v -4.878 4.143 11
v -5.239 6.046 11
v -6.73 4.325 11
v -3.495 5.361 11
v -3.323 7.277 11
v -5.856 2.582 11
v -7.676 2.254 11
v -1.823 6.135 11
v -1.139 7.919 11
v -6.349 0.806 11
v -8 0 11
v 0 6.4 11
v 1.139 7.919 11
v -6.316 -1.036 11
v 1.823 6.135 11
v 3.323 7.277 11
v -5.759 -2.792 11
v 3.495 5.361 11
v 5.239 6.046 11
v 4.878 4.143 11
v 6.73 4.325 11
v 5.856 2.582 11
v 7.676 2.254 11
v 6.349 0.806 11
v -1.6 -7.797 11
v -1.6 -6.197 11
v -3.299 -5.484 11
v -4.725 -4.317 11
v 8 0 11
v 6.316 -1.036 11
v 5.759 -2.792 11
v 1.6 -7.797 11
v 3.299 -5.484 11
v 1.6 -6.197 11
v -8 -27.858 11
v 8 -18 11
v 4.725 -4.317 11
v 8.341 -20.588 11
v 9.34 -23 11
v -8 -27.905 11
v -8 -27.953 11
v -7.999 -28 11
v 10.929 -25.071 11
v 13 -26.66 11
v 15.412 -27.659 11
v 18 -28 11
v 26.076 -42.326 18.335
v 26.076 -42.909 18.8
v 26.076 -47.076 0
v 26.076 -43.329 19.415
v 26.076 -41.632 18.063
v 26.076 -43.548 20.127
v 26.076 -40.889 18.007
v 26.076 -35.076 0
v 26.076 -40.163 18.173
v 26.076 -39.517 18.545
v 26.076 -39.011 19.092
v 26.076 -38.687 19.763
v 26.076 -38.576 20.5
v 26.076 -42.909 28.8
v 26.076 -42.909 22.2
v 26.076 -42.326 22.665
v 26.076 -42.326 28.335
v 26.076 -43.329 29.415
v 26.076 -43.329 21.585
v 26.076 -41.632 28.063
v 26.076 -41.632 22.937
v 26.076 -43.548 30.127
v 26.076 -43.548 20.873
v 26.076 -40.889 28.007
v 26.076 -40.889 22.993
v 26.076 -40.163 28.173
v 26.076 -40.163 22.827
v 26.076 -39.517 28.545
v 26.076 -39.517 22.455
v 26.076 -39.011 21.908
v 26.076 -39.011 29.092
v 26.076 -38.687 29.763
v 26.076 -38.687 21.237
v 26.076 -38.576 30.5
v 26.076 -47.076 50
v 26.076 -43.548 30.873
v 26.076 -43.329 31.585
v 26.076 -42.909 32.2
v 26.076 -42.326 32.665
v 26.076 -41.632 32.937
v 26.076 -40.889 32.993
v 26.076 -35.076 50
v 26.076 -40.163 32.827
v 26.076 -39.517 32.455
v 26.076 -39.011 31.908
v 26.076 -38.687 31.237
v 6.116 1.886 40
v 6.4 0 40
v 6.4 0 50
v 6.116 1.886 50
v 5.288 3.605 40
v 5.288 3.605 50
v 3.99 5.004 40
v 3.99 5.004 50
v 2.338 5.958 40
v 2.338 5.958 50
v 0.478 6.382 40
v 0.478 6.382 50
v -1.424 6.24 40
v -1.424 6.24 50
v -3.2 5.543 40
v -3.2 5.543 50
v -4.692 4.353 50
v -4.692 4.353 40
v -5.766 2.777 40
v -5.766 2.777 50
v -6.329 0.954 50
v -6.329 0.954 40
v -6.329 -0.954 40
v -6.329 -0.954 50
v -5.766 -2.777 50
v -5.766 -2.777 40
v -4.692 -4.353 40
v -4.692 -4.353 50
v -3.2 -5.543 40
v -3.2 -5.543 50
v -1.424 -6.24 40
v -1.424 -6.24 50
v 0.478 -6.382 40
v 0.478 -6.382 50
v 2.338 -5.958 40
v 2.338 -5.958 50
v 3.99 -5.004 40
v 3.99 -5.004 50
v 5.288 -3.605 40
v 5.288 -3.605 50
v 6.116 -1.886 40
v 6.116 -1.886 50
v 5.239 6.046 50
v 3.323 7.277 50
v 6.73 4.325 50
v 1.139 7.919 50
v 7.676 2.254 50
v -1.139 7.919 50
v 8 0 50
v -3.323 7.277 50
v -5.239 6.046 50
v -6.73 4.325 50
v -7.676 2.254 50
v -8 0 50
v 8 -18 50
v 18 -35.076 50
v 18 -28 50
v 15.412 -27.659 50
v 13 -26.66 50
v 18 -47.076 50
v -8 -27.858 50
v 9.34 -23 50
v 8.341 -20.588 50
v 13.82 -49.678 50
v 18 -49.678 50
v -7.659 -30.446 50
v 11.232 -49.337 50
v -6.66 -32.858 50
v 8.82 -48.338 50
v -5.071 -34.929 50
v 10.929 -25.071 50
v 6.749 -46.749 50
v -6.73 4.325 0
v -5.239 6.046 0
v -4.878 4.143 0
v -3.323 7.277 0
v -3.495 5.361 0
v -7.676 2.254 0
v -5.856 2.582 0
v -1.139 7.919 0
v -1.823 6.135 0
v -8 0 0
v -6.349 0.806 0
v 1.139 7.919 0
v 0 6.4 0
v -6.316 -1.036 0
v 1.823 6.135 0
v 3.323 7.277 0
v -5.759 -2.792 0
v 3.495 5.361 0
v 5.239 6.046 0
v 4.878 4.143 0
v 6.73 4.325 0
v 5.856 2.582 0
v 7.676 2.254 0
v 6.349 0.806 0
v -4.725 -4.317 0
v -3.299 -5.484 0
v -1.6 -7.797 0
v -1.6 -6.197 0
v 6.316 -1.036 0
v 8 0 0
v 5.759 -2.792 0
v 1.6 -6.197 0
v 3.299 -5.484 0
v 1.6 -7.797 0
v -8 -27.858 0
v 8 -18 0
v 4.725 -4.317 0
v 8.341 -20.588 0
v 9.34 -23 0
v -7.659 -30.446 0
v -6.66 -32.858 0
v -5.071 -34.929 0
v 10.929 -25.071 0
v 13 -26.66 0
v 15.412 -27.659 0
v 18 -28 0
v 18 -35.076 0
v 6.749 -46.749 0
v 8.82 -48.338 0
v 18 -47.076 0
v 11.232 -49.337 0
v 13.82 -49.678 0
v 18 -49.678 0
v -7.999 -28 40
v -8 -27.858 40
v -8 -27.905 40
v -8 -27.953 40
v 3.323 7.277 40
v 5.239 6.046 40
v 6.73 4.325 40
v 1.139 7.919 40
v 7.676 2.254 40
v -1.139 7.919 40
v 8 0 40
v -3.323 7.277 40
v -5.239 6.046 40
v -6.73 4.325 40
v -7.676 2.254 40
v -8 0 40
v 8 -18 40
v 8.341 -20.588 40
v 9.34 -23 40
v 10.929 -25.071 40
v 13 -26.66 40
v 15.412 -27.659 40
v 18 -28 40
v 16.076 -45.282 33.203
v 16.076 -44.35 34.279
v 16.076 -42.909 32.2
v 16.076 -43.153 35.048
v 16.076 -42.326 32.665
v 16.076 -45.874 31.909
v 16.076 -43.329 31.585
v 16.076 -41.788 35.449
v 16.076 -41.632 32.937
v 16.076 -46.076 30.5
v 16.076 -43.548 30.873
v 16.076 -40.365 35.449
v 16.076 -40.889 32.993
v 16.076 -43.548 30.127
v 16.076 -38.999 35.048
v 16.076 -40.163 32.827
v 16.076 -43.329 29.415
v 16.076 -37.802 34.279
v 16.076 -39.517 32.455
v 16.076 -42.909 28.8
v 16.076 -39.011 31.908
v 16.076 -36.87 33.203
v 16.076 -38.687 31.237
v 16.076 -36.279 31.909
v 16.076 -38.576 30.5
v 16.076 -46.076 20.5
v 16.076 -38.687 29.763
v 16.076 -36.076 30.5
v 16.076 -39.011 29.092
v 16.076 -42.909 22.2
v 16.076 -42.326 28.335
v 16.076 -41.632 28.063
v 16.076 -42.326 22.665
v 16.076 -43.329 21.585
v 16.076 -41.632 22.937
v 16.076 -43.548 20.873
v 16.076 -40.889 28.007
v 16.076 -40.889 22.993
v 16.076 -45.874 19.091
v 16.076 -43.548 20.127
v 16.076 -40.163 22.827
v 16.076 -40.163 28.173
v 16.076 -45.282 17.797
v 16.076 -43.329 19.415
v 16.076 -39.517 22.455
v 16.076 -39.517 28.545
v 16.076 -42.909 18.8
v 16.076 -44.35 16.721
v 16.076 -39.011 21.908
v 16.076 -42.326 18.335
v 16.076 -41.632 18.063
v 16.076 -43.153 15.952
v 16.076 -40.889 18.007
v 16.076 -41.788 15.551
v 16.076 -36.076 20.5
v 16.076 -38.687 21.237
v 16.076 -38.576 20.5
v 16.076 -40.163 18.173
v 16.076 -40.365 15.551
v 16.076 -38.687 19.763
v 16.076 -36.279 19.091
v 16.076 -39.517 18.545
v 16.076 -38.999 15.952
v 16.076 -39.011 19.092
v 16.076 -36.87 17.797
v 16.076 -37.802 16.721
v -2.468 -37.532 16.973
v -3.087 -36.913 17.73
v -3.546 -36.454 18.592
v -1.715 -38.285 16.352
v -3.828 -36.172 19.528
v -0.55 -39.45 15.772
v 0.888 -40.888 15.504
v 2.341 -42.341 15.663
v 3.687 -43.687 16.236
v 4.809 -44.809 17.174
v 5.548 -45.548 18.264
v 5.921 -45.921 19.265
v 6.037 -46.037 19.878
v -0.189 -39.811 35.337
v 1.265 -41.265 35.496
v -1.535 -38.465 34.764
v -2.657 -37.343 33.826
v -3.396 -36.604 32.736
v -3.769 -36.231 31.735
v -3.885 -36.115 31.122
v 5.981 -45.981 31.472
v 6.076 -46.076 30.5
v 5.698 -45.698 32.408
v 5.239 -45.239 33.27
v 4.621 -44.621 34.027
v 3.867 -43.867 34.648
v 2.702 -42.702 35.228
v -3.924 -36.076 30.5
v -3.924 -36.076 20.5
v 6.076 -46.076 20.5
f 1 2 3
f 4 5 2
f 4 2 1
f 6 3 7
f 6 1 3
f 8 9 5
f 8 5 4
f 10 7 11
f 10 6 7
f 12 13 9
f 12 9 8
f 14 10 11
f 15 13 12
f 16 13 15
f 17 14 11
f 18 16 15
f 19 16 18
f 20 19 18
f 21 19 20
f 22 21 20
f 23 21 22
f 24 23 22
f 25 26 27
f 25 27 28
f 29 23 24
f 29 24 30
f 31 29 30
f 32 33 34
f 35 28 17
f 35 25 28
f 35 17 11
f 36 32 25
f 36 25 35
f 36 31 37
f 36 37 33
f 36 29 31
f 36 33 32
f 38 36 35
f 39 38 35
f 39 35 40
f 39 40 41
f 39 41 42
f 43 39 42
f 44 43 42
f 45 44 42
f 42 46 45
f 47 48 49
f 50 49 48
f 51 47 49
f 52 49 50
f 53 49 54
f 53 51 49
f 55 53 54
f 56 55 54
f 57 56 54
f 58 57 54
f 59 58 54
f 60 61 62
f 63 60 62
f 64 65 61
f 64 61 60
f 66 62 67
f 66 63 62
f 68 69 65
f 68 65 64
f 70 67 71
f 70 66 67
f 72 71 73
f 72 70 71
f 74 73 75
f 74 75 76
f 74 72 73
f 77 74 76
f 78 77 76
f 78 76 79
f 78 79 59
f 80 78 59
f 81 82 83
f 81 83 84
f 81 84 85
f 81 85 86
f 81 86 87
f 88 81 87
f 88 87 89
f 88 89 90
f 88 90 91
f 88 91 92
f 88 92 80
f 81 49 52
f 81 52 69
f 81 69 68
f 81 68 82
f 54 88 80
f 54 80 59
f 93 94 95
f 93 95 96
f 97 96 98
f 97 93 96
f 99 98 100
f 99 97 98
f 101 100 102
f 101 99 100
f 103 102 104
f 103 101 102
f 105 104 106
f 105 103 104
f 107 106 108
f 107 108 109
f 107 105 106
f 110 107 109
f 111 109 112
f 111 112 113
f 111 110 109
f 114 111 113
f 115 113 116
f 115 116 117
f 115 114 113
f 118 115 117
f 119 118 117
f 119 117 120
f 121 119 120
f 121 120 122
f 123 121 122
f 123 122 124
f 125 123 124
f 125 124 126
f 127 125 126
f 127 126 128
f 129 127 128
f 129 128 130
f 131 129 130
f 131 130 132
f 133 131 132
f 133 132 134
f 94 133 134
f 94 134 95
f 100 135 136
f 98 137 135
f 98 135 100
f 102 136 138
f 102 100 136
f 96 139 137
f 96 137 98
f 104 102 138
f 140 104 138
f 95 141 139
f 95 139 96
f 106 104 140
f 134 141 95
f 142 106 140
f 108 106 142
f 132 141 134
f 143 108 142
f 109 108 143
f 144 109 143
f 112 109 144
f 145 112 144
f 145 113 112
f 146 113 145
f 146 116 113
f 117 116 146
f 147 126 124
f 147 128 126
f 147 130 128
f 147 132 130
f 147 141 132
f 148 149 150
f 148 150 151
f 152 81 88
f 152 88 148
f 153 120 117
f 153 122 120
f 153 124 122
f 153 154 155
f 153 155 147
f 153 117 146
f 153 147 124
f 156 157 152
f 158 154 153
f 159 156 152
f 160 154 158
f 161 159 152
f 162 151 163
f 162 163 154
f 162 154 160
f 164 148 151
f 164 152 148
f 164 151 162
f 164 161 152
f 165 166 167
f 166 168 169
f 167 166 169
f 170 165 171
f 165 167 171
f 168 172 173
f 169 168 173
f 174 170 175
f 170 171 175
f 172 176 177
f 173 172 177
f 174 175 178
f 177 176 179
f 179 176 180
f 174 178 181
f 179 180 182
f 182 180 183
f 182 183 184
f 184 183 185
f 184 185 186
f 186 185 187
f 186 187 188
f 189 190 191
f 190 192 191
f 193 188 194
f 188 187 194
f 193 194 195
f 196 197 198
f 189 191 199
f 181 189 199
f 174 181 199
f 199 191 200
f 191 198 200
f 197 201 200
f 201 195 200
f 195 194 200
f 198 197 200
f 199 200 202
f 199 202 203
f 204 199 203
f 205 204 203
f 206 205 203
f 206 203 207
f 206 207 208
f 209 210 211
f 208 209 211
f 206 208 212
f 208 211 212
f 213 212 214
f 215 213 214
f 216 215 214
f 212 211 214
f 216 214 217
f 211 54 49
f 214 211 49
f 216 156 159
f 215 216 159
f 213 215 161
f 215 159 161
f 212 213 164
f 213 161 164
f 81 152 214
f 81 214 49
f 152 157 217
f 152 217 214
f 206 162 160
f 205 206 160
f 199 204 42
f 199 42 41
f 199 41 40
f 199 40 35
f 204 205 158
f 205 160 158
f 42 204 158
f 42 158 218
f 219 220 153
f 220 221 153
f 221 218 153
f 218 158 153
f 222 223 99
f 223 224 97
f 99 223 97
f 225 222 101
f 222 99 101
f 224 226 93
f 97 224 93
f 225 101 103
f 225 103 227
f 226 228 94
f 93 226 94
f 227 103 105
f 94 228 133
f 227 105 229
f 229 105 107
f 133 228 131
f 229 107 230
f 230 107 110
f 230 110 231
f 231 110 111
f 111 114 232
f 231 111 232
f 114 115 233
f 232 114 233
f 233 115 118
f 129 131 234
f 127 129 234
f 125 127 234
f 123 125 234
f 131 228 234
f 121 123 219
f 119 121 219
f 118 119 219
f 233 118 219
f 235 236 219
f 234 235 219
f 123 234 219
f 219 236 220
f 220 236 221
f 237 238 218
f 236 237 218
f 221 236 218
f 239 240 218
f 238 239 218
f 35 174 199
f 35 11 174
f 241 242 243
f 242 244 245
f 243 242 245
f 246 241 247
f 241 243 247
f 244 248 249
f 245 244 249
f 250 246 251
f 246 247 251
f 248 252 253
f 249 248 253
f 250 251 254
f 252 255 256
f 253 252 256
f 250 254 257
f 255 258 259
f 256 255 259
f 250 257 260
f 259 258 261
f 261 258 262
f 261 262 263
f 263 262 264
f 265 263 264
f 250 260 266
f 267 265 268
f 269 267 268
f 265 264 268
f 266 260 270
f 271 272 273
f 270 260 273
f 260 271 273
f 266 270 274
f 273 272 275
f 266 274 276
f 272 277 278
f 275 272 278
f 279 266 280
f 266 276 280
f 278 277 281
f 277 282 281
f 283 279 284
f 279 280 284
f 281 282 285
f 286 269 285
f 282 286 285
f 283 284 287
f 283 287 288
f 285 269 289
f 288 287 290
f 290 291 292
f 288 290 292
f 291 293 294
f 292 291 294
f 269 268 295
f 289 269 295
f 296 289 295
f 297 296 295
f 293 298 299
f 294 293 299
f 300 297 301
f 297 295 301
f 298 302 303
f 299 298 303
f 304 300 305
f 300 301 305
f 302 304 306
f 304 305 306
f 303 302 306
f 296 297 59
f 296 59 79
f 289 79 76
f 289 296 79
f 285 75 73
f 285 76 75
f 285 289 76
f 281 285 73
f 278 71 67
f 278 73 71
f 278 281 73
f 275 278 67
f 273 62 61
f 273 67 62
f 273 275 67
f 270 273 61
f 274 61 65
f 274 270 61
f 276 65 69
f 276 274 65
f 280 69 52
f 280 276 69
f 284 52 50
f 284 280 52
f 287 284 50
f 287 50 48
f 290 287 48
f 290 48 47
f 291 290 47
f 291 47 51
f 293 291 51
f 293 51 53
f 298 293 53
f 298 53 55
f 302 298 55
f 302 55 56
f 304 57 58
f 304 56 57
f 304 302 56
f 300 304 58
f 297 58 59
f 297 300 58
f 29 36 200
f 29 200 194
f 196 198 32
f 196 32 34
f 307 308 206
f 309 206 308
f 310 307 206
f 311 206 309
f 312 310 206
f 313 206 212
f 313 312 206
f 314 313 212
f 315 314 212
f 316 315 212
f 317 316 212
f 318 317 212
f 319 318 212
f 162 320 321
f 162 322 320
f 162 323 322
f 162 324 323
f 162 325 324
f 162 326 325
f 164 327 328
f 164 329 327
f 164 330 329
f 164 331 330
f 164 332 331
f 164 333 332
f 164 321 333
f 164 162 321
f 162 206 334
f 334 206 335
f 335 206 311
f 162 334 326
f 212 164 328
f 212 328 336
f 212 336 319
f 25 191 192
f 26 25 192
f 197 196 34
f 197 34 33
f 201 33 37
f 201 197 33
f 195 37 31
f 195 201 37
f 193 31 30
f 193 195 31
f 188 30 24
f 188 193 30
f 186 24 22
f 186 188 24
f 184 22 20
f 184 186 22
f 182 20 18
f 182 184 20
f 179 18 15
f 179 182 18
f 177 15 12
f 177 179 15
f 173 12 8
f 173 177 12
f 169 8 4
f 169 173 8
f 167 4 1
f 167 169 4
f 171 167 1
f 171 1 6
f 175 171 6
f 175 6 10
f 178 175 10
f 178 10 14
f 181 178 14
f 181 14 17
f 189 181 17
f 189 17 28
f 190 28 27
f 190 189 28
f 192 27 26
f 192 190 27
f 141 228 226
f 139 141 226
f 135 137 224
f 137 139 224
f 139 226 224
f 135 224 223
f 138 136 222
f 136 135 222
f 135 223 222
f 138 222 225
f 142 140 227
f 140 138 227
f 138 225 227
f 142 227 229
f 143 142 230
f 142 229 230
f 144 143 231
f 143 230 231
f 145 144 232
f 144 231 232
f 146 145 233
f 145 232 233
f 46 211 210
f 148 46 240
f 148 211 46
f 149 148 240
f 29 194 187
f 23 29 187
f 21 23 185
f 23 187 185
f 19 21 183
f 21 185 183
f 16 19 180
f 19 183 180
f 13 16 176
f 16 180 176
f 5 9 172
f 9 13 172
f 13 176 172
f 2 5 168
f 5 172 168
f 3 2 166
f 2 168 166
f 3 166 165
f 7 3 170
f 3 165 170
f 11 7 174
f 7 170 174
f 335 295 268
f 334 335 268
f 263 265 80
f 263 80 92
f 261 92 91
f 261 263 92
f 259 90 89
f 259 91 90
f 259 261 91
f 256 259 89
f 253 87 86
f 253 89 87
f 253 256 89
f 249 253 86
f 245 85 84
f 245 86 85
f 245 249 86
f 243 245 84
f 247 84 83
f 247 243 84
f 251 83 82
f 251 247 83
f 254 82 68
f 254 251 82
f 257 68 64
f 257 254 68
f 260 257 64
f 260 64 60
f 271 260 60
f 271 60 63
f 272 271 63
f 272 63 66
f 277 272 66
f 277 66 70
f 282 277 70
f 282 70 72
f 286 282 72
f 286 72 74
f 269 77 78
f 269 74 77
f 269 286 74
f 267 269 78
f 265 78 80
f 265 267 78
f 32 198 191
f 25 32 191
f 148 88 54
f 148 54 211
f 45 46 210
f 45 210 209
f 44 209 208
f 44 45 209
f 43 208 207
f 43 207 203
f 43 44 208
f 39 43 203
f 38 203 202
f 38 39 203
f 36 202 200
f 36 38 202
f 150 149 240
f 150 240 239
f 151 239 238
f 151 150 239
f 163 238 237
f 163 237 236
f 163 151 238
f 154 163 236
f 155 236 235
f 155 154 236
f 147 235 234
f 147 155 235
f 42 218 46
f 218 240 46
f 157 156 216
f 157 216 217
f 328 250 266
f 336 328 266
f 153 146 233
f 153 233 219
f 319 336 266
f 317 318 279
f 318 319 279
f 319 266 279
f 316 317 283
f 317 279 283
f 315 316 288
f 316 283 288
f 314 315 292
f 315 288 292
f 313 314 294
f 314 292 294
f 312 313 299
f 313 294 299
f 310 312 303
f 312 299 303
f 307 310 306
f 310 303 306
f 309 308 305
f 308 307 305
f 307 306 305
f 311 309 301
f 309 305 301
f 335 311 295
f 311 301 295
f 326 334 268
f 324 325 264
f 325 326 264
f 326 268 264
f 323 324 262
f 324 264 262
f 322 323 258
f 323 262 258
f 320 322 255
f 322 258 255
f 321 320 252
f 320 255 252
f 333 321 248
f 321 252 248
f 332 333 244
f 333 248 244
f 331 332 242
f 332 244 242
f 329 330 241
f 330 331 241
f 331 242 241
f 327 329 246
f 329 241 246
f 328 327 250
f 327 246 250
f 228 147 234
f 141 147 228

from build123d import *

# Parameters (mm, degrees)
SKETCH1_R               = 12
SKETCH1_R_2             = 6.4
BOSS_EXTRUDE1_DEPTH     = 50
CUT_EXTRUDE1_DEPTH      = 53.80151513
CUT_EXTRUDE1_DEPTH_BACK = 53.80151513
SKETCH2_R               = 12
SKETCH2_R_2             = 8
BOSS_EXTRUDE2_DEPTH     = 50
SKETCH4_W               = 29
SKETCH4_H               = 42.03410999
CUT_EXTRUDE2_DEPTH      = 79.288280436
CUT_EXTRUDE6_DEPTH      = 79.288280436
CUT_EXTRUDE6_DEPTH_BACK = 79.288280436
SKETCH8_R               = 2.5
CUT_EXTRUDE9_START      = -10
CUT_EXTRUDE9_DEPTH      = 20
SKETCH10_W              = 3.2
SKETCH10_H              = 1.6
CUT_EXTRUDE10_DEPTH     = 20
FILLET1_R               = 10


with BuildPart() as part:
    # Sketch1 → Boss-Extrude1 (new body)
    with BuildSketch(Plane.XY):
        Circle(SKETCH1_R)
        Circle(SKETCH1_R_2, mode=Mode.SUBTRACT)
    extrude(amount=BOSS_EXTRUDE1_DEPTH)

    # Sketch2 → Cut-Extrude1 (cut, two sides: drawn at the far end of the back side and taken through both)
    with BuildSketch(Plane.XY.offset(50).offset(-CUT_EXTRUDE1_DEPTH_BACK)):
        Circle(SKETCH2_R)
        Circle(SKETCH2_R_2, mode=Mode.SUBTRACT)
    extrude(amount=CUT_EXTRUDE1_DEPTH + CUT_EXTRUDE1_DEPTH_BACK, mode=Mode.SUBTRACT)

    # Sketch3 → Boss-Extrude2 (add, through all)
    with BuildSketch(Plane.XY.offset(50)):
        with BuildLine():
            Line((-8, 0), (-8, -32))
            Line((-8, -32), (9.67766953, -49.67766953))
            Line((9.67766953, -49.67766953), (18, -49.67766953))
            Line((18, -49.67766953), (18, -47.076150072))
            Line((18, -47.076150072), (26.076150072, -47.076150072))
            Line((26.076150072, -47.076150072), (26.076150072, -35.076150072))
            Line((26.076150072, -35.076150072), (18, -35.076150072))
            Line((18, -35.076150072), (18, -28))
            Line((18, -28), (8, -28))
            Line((8, -28), (8, 0))
            ThreePointArc((8, 0), (0, -8), (-8, 0))
        make_face()
    extrude(amount=-BOSS_EXTRUDE2_DEPTH)

    # Sketch4 → Cut-Extrude2 (cut, through all)
    with BuildSketch(Plane(origin=(26.076150072, 0, 0), x_dir=(0, 0, -1), z_dir=(1, 0, 0))):
        with Locations((-25.5, -6.982945005)):
            Rectangle(SKETCH4_W, SKETCH4_H)
    extrude(amount=-CUT_EXTRUDE2_DEPTH, mode=Mode.SUBTRACT)

    # Sketch8 → Cut-Extrude6 (cut, two sides: drawn at the far end of the back side and taken through both)
    with BuildSketch(Plane(origin=(26.076150072, 0, 0), x_dir=(0, 0, -1), z_dir=(1, 0, 0)).offset(-CUT_EXTRUDE6_DEPTH_BACK)):
        with Locations(Location((-30.5, -41.076150072, 0), (0, 0, 90))):
            Circle(SKETCH8_R)
        with Locations(Location((-20.5, -41.076150072, 0), (0, 0, 90))):
            Circle(SKETCH8_R)
    extrude(amount=CUT_EXTRUDE6_DEPTH + CUT_EXTRUDE6_DEPTH_BACK, mode=Mode.SUBTRACT)

    # Sketch9 → Cut-Extrude9 (cut)
    with BuildSketch(Plane(origin=(26.076150072, 0, 0), x_dir=(0, 0, -1), z_dir=(1, 0, 0)).offset(CUT_EXTRUDE9_START)):
        with BuildLine():
            Line((-20.5, -36.076150072), (-30.5, -36.076150072))
            ThreePointArc((-30.5, -36.076150072), (-35.5, -41.076150072), (-30.5, -46.076150072))
            Line((-30.5, -46.076150072), (-20.5, -46.076150072))
            ThreePointArc((-20.5, -46.076150072), (-15.5, -41.076150072), (-20.5, -36.076150072))
        make_face()
    extrude(amount=-CUT_EXTRUDE9_DEPTH, mode=Mode.SUBTRACT)

    # Sketch10 → Cut-Extrude10 (cut)
    with BuildSketch(Plane(origin=(0, 0, 0), x_dir=(-1, 0, 0), z_dir=(0, 0, -1))):
        with Locations((0, -6.996773354)):
            Rectangle(SKETCH10_W, SKETCH10_H)
    extrude(amount=-CUT_EXTRUDE10_DEPTH, mode=Mode.SUBTRACT)

    # Fillet1
    # the kernel refuses this fillet: 10 mm, written as the material it adds along each edge
    with BuildSketch(Plane(origin=(8, -28, 11), x_dir=(0, 1, 0), z_dir=(0, 0, -1))) as fillet1_piece_1:
        with BuildLine():
            CenterArc((FILLET1_R, FILLET1_R), FILLET1_R, 180, 90)
            Line((0, FILLET1_R), (0, 0))
            Line((0, 0), (FILLET1_R, 0))
        make_face()
    extrude(amount=11)
    with BuildSketch(Plane(origin=(8, -28, 50), x_dir=(1, 0, 0), z_dir=(0, 0, -1))) as fillet1_piece_2:
        with BuildLine():
            CenterArc((FILLET1_R, -FILLET1_R), FILLET1_R, 90, 90)
            Line((0, -FILLET1_R), (0, 0))
            Line((0, 0), (FILLET1_R, 0))
        make_face()
    extrude(amount=10)
    # the kernel refuses this fillet: 10 mm, written as the material it takes off along each edge
    with BuildSketch(Plane(origin=(-8, -32, 60.355339059), x_dir=(0.7071067811865476, -0.7071067811865474, 0), z_dir=(0, 0, -1)), Plane(origin=(9.67766953, -49.67766953, 60.355339059), x_dir=(1, 0, 0), z_dir=(0, 0, -1))) as fillet1_2_piece_1:
        with BuildLine():
            CenterArc((FILLET1_R * 0.414213562373, -FILLET1_R), FILLET1_R, 90, 45)
            Line((-FILLET1_R * 0.292893218813, -FILLET1_R * 0.292893218813), (0, 0))
            Line((0, 0), (FILLET1_R * 0.414213562373, 0))
        make_face()
    extrude(amount=70.710678119, mode=Mode.SUBTRACT)


solid = part.part
